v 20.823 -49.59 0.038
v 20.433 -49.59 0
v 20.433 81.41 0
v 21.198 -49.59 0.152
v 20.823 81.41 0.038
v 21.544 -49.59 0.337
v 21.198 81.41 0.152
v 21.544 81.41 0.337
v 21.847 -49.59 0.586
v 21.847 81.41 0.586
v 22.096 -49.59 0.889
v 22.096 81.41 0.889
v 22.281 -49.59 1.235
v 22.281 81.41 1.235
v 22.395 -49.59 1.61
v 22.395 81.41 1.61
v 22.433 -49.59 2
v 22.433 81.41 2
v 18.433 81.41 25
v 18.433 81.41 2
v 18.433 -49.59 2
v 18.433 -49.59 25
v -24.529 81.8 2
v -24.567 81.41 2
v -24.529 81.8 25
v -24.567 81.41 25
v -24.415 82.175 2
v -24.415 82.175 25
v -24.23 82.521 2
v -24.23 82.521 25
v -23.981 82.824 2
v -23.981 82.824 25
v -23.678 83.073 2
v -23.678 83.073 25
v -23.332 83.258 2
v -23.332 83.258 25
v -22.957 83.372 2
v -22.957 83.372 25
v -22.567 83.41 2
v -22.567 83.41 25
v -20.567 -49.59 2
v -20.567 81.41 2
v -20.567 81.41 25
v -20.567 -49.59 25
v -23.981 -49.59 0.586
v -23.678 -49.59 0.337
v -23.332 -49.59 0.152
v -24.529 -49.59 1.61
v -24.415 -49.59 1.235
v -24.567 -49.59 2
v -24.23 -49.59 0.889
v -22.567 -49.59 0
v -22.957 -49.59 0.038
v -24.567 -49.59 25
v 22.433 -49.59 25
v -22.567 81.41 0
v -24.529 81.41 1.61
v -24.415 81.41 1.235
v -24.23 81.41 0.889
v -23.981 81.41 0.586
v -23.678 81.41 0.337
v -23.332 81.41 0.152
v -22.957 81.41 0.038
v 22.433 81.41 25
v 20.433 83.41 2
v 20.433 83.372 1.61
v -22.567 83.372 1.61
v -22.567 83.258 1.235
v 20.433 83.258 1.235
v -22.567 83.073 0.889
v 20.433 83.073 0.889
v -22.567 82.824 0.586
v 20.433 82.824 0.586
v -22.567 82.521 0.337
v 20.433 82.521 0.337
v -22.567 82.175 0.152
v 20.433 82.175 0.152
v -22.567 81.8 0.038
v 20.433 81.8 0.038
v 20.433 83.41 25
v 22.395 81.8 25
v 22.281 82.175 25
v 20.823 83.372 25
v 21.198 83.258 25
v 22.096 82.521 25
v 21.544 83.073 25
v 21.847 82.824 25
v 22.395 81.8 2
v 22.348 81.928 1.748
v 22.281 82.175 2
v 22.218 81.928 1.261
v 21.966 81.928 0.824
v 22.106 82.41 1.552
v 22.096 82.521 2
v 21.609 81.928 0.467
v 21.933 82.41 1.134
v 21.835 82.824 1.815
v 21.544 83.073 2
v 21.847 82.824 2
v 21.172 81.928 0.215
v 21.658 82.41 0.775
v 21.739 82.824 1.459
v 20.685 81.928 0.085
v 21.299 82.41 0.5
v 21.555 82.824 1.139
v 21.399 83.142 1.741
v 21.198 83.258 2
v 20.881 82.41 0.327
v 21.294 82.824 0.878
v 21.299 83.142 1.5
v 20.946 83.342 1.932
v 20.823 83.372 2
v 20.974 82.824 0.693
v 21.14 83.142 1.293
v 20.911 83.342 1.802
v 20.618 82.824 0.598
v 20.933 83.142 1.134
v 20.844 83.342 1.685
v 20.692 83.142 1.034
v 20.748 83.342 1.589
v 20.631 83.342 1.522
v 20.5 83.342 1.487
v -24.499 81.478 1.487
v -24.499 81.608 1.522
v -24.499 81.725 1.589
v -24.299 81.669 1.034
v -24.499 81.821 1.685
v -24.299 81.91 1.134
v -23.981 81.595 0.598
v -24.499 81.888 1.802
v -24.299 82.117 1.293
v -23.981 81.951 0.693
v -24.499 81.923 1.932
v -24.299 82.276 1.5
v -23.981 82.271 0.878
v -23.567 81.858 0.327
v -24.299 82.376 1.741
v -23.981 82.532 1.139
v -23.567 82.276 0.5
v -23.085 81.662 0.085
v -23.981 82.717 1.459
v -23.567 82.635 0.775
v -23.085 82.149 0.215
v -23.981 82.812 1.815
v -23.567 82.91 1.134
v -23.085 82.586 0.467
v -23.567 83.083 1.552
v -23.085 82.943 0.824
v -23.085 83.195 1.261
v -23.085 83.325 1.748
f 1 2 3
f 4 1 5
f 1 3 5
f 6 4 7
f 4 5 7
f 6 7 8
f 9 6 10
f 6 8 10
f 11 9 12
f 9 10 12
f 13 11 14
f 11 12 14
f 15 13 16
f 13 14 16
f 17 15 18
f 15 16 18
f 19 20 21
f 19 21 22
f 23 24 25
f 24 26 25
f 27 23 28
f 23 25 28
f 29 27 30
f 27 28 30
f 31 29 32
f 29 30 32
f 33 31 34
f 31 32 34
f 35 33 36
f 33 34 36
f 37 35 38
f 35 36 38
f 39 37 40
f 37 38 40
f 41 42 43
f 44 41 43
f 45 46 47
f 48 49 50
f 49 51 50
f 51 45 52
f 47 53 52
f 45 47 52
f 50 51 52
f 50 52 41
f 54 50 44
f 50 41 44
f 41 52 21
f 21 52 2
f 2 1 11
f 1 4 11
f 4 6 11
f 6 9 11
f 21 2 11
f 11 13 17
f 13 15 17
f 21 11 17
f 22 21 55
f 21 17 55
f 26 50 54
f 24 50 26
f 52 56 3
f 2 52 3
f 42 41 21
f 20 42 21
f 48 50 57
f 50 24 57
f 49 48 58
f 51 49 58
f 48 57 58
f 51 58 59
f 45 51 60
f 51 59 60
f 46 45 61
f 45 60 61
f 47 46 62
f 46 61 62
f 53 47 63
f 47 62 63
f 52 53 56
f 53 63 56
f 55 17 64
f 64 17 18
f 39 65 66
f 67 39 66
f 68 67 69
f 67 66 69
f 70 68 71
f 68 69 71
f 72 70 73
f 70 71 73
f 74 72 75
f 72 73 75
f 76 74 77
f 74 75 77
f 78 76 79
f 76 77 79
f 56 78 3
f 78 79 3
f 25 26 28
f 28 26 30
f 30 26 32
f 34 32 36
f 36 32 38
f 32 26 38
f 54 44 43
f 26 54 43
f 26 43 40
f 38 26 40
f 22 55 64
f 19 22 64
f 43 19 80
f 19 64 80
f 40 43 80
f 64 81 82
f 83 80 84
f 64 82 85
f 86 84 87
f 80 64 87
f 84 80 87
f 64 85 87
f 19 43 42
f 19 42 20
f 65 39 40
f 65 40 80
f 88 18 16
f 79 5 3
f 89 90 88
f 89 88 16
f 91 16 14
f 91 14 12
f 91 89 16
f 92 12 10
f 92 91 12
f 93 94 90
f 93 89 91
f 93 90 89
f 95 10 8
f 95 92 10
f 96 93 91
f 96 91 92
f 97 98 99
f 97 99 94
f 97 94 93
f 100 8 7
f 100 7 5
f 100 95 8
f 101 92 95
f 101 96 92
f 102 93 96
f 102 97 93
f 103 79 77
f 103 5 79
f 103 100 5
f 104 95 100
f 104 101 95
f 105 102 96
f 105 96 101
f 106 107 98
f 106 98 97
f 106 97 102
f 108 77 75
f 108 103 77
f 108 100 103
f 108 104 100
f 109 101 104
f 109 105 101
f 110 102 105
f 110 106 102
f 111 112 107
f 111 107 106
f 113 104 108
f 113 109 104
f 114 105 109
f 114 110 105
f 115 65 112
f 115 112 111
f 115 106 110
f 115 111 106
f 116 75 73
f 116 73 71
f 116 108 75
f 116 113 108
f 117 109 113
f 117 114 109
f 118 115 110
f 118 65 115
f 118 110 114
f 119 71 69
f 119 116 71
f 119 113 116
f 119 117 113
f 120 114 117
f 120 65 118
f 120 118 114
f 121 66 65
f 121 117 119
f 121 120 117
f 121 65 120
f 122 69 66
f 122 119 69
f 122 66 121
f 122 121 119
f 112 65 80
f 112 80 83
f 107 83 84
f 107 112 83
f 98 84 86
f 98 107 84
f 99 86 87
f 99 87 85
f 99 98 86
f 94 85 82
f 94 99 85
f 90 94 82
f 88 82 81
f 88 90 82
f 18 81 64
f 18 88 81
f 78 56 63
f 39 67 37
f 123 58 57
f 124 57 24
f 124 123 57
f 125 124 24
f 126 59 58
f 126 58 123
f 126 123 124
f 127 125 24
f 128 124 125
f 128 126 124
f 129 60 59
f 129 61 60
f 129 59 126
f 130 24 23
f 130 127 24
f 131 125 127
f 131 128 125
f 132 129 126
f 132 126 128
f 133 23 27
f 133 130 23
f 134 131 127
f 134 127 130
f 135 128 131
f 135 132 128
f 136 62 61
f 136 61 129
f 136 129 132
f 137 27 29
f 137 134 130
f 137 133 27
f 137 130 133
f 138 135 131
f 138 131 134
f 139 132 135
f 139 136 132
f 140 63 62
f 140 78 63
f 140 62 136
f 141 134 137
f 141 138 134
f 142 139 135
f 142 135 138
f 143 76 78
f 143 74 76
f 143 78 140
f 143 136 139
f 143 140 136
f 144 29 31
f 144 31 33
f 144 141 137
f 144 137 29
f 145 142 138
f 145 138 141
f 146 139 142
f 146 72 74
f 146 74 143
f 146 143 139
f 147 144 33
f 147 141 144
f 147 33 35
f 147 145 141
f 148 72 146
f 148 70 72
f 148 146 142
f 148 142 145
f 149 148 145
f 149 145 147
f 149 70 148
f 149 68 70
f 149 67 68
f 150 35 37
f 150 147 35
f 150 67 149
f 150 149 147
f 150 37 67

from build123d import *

# Parameters (mm, degrees)
F0_W        = 47
F0_H        = 133
F1_DEPTH    = 25
F2_W        = 41
F2_H        = 23
F3_DEPTH    = 131
F4_R        = 2
F5_R        = 2
F6_T1_DEPTH = 28
F6_S5_W     = 2
F6_S5_H     = 2
F6_T6_DEPTH = 2
F7_DEPTH    = 1
F8_DEPTH    = 1
F9_DEPTH    = 0.5


# Not quite as in the source:
# - a fillet or chamfer that OpenCascade refuses, or shapes differently, is made with other operations: its cross-section is extruded or revolved along the edge and cut away or added


with BuildPart() as f1:
    # F0 (on Top) → F1 (new body)
    with BuildSketch(Plane.XY):
        with Locations((-1.0670694858, 16.9100829363)):
            Rectangle(F0_W, F0_H)
    extrude(amount=F1_DEPTH)

    # F2 (on face) → F3 (cut, through all)
    with BuildSketch(Plane.XZ.offset(49.5899170637)):
        with Locations((-1.0670694858, 13.5)):
            Rectangle(F2_W, F2_H)
    extrude(amount=-F3_DEPTH, mode=Mode.SUBTRACT)

    # F4
    f4_edges = [f1.edges().sort_by_distance(p)[0] for p in [
        (22.432931, 16.910083, 0),
        (-1.067069, 83.410083, 0),
    ]]
    fillet(f4_edges, radius=F4_R)

    # F5
    f5_edges = [f1.edges().sort_by_distance(p)[0] for p in [
        (-24.567069, 15.910083, 0),
    ]]
    fillet(f5_edges, radius=F5_R)

    # F6: fillet of radius 2 on 1 edges, made by hand

    # F6_s2 → F6_t1 (cut)
    with BuildSketch(Plane.XY.offset(2)):
        with BuildLine():
            ThreePointArc((20.4329305142, 83.4100829363), (21.8471440766, 82.8242964987), (22.4329305142, 81.4100829363))
            Line((22.4329305142, 81.4100829363), (22.4329305142, 83.4100829363))
            Line((22.4329305142, 83.4100829363), (20.4329305142, 83.4100829363))
        make_face()
    extrude(amount=F6_T1_DEPTH, mode=Mode.SUBTRACT)


with BuildPart() as f6_tool4:
    # F6_s5 → F6_t6 (new body)
    with BuildSketch(Plane.XZ.offset(-81.4100829363)):
        with Locations((21.4329305142, 1)):
            Rectangle(F6_S5_W, F6_S5_H)
    extrude(amount=-F6_T6_DEPTH)

    # F6_s7 → F6_t8 (revolve, cut)
    with BuildSketch(Plane(origin=(20.4329305142, 81.4100829363, 2), x_dir=(-0.7071067812, 0, 0.7071067812), z_dir=(-0.7071067812, 0, -0.7071067812))):
        with BuildLine():
            ThreePointArc((0, -2), (2, 0), (0, 2))
            Line((0, 2), (0, -2))
        make_face()
    revolve(axis=Axis((20.4329305142, 81.4100829363, 2), (0, 1, 0)), mode=Mode.SUBTRACT)


with BuildPart() as f1_1:
    add(f1.part)

    # F6_t3: cut F6_tool4
    add(f6_tool4.part, mode=Mode.SUBTRACT)

    # F7 (add): a face of the model
    f7_faces = [f1_1.faces().sort_by_distance(p)[0] for p in [
        (-21.5670694858, 15.9100829363, 13.5),
    ]]
    extrude(f7_faces, amount=F7_DEPTH)

    # F8 (add): a face of the model
    f8_faces = [f1_1.faces().sort_by_distance(p)[0] for p in [
        (19.4329305142, 15.9100829363, 13.5),
    ]]
    extrude(f8_faces, amount=F8_DEPTH)

    # F9 (add): a face of the model
    f9_faces = [f1_1.faces().sort_by_distance(p)[0] for p in [
        (-20.5670694858, 15.9100829363, 13.5),
    ]]
    extrude(f9_faces, amount=-F9_DEPTH)


solid = f1_1.part
